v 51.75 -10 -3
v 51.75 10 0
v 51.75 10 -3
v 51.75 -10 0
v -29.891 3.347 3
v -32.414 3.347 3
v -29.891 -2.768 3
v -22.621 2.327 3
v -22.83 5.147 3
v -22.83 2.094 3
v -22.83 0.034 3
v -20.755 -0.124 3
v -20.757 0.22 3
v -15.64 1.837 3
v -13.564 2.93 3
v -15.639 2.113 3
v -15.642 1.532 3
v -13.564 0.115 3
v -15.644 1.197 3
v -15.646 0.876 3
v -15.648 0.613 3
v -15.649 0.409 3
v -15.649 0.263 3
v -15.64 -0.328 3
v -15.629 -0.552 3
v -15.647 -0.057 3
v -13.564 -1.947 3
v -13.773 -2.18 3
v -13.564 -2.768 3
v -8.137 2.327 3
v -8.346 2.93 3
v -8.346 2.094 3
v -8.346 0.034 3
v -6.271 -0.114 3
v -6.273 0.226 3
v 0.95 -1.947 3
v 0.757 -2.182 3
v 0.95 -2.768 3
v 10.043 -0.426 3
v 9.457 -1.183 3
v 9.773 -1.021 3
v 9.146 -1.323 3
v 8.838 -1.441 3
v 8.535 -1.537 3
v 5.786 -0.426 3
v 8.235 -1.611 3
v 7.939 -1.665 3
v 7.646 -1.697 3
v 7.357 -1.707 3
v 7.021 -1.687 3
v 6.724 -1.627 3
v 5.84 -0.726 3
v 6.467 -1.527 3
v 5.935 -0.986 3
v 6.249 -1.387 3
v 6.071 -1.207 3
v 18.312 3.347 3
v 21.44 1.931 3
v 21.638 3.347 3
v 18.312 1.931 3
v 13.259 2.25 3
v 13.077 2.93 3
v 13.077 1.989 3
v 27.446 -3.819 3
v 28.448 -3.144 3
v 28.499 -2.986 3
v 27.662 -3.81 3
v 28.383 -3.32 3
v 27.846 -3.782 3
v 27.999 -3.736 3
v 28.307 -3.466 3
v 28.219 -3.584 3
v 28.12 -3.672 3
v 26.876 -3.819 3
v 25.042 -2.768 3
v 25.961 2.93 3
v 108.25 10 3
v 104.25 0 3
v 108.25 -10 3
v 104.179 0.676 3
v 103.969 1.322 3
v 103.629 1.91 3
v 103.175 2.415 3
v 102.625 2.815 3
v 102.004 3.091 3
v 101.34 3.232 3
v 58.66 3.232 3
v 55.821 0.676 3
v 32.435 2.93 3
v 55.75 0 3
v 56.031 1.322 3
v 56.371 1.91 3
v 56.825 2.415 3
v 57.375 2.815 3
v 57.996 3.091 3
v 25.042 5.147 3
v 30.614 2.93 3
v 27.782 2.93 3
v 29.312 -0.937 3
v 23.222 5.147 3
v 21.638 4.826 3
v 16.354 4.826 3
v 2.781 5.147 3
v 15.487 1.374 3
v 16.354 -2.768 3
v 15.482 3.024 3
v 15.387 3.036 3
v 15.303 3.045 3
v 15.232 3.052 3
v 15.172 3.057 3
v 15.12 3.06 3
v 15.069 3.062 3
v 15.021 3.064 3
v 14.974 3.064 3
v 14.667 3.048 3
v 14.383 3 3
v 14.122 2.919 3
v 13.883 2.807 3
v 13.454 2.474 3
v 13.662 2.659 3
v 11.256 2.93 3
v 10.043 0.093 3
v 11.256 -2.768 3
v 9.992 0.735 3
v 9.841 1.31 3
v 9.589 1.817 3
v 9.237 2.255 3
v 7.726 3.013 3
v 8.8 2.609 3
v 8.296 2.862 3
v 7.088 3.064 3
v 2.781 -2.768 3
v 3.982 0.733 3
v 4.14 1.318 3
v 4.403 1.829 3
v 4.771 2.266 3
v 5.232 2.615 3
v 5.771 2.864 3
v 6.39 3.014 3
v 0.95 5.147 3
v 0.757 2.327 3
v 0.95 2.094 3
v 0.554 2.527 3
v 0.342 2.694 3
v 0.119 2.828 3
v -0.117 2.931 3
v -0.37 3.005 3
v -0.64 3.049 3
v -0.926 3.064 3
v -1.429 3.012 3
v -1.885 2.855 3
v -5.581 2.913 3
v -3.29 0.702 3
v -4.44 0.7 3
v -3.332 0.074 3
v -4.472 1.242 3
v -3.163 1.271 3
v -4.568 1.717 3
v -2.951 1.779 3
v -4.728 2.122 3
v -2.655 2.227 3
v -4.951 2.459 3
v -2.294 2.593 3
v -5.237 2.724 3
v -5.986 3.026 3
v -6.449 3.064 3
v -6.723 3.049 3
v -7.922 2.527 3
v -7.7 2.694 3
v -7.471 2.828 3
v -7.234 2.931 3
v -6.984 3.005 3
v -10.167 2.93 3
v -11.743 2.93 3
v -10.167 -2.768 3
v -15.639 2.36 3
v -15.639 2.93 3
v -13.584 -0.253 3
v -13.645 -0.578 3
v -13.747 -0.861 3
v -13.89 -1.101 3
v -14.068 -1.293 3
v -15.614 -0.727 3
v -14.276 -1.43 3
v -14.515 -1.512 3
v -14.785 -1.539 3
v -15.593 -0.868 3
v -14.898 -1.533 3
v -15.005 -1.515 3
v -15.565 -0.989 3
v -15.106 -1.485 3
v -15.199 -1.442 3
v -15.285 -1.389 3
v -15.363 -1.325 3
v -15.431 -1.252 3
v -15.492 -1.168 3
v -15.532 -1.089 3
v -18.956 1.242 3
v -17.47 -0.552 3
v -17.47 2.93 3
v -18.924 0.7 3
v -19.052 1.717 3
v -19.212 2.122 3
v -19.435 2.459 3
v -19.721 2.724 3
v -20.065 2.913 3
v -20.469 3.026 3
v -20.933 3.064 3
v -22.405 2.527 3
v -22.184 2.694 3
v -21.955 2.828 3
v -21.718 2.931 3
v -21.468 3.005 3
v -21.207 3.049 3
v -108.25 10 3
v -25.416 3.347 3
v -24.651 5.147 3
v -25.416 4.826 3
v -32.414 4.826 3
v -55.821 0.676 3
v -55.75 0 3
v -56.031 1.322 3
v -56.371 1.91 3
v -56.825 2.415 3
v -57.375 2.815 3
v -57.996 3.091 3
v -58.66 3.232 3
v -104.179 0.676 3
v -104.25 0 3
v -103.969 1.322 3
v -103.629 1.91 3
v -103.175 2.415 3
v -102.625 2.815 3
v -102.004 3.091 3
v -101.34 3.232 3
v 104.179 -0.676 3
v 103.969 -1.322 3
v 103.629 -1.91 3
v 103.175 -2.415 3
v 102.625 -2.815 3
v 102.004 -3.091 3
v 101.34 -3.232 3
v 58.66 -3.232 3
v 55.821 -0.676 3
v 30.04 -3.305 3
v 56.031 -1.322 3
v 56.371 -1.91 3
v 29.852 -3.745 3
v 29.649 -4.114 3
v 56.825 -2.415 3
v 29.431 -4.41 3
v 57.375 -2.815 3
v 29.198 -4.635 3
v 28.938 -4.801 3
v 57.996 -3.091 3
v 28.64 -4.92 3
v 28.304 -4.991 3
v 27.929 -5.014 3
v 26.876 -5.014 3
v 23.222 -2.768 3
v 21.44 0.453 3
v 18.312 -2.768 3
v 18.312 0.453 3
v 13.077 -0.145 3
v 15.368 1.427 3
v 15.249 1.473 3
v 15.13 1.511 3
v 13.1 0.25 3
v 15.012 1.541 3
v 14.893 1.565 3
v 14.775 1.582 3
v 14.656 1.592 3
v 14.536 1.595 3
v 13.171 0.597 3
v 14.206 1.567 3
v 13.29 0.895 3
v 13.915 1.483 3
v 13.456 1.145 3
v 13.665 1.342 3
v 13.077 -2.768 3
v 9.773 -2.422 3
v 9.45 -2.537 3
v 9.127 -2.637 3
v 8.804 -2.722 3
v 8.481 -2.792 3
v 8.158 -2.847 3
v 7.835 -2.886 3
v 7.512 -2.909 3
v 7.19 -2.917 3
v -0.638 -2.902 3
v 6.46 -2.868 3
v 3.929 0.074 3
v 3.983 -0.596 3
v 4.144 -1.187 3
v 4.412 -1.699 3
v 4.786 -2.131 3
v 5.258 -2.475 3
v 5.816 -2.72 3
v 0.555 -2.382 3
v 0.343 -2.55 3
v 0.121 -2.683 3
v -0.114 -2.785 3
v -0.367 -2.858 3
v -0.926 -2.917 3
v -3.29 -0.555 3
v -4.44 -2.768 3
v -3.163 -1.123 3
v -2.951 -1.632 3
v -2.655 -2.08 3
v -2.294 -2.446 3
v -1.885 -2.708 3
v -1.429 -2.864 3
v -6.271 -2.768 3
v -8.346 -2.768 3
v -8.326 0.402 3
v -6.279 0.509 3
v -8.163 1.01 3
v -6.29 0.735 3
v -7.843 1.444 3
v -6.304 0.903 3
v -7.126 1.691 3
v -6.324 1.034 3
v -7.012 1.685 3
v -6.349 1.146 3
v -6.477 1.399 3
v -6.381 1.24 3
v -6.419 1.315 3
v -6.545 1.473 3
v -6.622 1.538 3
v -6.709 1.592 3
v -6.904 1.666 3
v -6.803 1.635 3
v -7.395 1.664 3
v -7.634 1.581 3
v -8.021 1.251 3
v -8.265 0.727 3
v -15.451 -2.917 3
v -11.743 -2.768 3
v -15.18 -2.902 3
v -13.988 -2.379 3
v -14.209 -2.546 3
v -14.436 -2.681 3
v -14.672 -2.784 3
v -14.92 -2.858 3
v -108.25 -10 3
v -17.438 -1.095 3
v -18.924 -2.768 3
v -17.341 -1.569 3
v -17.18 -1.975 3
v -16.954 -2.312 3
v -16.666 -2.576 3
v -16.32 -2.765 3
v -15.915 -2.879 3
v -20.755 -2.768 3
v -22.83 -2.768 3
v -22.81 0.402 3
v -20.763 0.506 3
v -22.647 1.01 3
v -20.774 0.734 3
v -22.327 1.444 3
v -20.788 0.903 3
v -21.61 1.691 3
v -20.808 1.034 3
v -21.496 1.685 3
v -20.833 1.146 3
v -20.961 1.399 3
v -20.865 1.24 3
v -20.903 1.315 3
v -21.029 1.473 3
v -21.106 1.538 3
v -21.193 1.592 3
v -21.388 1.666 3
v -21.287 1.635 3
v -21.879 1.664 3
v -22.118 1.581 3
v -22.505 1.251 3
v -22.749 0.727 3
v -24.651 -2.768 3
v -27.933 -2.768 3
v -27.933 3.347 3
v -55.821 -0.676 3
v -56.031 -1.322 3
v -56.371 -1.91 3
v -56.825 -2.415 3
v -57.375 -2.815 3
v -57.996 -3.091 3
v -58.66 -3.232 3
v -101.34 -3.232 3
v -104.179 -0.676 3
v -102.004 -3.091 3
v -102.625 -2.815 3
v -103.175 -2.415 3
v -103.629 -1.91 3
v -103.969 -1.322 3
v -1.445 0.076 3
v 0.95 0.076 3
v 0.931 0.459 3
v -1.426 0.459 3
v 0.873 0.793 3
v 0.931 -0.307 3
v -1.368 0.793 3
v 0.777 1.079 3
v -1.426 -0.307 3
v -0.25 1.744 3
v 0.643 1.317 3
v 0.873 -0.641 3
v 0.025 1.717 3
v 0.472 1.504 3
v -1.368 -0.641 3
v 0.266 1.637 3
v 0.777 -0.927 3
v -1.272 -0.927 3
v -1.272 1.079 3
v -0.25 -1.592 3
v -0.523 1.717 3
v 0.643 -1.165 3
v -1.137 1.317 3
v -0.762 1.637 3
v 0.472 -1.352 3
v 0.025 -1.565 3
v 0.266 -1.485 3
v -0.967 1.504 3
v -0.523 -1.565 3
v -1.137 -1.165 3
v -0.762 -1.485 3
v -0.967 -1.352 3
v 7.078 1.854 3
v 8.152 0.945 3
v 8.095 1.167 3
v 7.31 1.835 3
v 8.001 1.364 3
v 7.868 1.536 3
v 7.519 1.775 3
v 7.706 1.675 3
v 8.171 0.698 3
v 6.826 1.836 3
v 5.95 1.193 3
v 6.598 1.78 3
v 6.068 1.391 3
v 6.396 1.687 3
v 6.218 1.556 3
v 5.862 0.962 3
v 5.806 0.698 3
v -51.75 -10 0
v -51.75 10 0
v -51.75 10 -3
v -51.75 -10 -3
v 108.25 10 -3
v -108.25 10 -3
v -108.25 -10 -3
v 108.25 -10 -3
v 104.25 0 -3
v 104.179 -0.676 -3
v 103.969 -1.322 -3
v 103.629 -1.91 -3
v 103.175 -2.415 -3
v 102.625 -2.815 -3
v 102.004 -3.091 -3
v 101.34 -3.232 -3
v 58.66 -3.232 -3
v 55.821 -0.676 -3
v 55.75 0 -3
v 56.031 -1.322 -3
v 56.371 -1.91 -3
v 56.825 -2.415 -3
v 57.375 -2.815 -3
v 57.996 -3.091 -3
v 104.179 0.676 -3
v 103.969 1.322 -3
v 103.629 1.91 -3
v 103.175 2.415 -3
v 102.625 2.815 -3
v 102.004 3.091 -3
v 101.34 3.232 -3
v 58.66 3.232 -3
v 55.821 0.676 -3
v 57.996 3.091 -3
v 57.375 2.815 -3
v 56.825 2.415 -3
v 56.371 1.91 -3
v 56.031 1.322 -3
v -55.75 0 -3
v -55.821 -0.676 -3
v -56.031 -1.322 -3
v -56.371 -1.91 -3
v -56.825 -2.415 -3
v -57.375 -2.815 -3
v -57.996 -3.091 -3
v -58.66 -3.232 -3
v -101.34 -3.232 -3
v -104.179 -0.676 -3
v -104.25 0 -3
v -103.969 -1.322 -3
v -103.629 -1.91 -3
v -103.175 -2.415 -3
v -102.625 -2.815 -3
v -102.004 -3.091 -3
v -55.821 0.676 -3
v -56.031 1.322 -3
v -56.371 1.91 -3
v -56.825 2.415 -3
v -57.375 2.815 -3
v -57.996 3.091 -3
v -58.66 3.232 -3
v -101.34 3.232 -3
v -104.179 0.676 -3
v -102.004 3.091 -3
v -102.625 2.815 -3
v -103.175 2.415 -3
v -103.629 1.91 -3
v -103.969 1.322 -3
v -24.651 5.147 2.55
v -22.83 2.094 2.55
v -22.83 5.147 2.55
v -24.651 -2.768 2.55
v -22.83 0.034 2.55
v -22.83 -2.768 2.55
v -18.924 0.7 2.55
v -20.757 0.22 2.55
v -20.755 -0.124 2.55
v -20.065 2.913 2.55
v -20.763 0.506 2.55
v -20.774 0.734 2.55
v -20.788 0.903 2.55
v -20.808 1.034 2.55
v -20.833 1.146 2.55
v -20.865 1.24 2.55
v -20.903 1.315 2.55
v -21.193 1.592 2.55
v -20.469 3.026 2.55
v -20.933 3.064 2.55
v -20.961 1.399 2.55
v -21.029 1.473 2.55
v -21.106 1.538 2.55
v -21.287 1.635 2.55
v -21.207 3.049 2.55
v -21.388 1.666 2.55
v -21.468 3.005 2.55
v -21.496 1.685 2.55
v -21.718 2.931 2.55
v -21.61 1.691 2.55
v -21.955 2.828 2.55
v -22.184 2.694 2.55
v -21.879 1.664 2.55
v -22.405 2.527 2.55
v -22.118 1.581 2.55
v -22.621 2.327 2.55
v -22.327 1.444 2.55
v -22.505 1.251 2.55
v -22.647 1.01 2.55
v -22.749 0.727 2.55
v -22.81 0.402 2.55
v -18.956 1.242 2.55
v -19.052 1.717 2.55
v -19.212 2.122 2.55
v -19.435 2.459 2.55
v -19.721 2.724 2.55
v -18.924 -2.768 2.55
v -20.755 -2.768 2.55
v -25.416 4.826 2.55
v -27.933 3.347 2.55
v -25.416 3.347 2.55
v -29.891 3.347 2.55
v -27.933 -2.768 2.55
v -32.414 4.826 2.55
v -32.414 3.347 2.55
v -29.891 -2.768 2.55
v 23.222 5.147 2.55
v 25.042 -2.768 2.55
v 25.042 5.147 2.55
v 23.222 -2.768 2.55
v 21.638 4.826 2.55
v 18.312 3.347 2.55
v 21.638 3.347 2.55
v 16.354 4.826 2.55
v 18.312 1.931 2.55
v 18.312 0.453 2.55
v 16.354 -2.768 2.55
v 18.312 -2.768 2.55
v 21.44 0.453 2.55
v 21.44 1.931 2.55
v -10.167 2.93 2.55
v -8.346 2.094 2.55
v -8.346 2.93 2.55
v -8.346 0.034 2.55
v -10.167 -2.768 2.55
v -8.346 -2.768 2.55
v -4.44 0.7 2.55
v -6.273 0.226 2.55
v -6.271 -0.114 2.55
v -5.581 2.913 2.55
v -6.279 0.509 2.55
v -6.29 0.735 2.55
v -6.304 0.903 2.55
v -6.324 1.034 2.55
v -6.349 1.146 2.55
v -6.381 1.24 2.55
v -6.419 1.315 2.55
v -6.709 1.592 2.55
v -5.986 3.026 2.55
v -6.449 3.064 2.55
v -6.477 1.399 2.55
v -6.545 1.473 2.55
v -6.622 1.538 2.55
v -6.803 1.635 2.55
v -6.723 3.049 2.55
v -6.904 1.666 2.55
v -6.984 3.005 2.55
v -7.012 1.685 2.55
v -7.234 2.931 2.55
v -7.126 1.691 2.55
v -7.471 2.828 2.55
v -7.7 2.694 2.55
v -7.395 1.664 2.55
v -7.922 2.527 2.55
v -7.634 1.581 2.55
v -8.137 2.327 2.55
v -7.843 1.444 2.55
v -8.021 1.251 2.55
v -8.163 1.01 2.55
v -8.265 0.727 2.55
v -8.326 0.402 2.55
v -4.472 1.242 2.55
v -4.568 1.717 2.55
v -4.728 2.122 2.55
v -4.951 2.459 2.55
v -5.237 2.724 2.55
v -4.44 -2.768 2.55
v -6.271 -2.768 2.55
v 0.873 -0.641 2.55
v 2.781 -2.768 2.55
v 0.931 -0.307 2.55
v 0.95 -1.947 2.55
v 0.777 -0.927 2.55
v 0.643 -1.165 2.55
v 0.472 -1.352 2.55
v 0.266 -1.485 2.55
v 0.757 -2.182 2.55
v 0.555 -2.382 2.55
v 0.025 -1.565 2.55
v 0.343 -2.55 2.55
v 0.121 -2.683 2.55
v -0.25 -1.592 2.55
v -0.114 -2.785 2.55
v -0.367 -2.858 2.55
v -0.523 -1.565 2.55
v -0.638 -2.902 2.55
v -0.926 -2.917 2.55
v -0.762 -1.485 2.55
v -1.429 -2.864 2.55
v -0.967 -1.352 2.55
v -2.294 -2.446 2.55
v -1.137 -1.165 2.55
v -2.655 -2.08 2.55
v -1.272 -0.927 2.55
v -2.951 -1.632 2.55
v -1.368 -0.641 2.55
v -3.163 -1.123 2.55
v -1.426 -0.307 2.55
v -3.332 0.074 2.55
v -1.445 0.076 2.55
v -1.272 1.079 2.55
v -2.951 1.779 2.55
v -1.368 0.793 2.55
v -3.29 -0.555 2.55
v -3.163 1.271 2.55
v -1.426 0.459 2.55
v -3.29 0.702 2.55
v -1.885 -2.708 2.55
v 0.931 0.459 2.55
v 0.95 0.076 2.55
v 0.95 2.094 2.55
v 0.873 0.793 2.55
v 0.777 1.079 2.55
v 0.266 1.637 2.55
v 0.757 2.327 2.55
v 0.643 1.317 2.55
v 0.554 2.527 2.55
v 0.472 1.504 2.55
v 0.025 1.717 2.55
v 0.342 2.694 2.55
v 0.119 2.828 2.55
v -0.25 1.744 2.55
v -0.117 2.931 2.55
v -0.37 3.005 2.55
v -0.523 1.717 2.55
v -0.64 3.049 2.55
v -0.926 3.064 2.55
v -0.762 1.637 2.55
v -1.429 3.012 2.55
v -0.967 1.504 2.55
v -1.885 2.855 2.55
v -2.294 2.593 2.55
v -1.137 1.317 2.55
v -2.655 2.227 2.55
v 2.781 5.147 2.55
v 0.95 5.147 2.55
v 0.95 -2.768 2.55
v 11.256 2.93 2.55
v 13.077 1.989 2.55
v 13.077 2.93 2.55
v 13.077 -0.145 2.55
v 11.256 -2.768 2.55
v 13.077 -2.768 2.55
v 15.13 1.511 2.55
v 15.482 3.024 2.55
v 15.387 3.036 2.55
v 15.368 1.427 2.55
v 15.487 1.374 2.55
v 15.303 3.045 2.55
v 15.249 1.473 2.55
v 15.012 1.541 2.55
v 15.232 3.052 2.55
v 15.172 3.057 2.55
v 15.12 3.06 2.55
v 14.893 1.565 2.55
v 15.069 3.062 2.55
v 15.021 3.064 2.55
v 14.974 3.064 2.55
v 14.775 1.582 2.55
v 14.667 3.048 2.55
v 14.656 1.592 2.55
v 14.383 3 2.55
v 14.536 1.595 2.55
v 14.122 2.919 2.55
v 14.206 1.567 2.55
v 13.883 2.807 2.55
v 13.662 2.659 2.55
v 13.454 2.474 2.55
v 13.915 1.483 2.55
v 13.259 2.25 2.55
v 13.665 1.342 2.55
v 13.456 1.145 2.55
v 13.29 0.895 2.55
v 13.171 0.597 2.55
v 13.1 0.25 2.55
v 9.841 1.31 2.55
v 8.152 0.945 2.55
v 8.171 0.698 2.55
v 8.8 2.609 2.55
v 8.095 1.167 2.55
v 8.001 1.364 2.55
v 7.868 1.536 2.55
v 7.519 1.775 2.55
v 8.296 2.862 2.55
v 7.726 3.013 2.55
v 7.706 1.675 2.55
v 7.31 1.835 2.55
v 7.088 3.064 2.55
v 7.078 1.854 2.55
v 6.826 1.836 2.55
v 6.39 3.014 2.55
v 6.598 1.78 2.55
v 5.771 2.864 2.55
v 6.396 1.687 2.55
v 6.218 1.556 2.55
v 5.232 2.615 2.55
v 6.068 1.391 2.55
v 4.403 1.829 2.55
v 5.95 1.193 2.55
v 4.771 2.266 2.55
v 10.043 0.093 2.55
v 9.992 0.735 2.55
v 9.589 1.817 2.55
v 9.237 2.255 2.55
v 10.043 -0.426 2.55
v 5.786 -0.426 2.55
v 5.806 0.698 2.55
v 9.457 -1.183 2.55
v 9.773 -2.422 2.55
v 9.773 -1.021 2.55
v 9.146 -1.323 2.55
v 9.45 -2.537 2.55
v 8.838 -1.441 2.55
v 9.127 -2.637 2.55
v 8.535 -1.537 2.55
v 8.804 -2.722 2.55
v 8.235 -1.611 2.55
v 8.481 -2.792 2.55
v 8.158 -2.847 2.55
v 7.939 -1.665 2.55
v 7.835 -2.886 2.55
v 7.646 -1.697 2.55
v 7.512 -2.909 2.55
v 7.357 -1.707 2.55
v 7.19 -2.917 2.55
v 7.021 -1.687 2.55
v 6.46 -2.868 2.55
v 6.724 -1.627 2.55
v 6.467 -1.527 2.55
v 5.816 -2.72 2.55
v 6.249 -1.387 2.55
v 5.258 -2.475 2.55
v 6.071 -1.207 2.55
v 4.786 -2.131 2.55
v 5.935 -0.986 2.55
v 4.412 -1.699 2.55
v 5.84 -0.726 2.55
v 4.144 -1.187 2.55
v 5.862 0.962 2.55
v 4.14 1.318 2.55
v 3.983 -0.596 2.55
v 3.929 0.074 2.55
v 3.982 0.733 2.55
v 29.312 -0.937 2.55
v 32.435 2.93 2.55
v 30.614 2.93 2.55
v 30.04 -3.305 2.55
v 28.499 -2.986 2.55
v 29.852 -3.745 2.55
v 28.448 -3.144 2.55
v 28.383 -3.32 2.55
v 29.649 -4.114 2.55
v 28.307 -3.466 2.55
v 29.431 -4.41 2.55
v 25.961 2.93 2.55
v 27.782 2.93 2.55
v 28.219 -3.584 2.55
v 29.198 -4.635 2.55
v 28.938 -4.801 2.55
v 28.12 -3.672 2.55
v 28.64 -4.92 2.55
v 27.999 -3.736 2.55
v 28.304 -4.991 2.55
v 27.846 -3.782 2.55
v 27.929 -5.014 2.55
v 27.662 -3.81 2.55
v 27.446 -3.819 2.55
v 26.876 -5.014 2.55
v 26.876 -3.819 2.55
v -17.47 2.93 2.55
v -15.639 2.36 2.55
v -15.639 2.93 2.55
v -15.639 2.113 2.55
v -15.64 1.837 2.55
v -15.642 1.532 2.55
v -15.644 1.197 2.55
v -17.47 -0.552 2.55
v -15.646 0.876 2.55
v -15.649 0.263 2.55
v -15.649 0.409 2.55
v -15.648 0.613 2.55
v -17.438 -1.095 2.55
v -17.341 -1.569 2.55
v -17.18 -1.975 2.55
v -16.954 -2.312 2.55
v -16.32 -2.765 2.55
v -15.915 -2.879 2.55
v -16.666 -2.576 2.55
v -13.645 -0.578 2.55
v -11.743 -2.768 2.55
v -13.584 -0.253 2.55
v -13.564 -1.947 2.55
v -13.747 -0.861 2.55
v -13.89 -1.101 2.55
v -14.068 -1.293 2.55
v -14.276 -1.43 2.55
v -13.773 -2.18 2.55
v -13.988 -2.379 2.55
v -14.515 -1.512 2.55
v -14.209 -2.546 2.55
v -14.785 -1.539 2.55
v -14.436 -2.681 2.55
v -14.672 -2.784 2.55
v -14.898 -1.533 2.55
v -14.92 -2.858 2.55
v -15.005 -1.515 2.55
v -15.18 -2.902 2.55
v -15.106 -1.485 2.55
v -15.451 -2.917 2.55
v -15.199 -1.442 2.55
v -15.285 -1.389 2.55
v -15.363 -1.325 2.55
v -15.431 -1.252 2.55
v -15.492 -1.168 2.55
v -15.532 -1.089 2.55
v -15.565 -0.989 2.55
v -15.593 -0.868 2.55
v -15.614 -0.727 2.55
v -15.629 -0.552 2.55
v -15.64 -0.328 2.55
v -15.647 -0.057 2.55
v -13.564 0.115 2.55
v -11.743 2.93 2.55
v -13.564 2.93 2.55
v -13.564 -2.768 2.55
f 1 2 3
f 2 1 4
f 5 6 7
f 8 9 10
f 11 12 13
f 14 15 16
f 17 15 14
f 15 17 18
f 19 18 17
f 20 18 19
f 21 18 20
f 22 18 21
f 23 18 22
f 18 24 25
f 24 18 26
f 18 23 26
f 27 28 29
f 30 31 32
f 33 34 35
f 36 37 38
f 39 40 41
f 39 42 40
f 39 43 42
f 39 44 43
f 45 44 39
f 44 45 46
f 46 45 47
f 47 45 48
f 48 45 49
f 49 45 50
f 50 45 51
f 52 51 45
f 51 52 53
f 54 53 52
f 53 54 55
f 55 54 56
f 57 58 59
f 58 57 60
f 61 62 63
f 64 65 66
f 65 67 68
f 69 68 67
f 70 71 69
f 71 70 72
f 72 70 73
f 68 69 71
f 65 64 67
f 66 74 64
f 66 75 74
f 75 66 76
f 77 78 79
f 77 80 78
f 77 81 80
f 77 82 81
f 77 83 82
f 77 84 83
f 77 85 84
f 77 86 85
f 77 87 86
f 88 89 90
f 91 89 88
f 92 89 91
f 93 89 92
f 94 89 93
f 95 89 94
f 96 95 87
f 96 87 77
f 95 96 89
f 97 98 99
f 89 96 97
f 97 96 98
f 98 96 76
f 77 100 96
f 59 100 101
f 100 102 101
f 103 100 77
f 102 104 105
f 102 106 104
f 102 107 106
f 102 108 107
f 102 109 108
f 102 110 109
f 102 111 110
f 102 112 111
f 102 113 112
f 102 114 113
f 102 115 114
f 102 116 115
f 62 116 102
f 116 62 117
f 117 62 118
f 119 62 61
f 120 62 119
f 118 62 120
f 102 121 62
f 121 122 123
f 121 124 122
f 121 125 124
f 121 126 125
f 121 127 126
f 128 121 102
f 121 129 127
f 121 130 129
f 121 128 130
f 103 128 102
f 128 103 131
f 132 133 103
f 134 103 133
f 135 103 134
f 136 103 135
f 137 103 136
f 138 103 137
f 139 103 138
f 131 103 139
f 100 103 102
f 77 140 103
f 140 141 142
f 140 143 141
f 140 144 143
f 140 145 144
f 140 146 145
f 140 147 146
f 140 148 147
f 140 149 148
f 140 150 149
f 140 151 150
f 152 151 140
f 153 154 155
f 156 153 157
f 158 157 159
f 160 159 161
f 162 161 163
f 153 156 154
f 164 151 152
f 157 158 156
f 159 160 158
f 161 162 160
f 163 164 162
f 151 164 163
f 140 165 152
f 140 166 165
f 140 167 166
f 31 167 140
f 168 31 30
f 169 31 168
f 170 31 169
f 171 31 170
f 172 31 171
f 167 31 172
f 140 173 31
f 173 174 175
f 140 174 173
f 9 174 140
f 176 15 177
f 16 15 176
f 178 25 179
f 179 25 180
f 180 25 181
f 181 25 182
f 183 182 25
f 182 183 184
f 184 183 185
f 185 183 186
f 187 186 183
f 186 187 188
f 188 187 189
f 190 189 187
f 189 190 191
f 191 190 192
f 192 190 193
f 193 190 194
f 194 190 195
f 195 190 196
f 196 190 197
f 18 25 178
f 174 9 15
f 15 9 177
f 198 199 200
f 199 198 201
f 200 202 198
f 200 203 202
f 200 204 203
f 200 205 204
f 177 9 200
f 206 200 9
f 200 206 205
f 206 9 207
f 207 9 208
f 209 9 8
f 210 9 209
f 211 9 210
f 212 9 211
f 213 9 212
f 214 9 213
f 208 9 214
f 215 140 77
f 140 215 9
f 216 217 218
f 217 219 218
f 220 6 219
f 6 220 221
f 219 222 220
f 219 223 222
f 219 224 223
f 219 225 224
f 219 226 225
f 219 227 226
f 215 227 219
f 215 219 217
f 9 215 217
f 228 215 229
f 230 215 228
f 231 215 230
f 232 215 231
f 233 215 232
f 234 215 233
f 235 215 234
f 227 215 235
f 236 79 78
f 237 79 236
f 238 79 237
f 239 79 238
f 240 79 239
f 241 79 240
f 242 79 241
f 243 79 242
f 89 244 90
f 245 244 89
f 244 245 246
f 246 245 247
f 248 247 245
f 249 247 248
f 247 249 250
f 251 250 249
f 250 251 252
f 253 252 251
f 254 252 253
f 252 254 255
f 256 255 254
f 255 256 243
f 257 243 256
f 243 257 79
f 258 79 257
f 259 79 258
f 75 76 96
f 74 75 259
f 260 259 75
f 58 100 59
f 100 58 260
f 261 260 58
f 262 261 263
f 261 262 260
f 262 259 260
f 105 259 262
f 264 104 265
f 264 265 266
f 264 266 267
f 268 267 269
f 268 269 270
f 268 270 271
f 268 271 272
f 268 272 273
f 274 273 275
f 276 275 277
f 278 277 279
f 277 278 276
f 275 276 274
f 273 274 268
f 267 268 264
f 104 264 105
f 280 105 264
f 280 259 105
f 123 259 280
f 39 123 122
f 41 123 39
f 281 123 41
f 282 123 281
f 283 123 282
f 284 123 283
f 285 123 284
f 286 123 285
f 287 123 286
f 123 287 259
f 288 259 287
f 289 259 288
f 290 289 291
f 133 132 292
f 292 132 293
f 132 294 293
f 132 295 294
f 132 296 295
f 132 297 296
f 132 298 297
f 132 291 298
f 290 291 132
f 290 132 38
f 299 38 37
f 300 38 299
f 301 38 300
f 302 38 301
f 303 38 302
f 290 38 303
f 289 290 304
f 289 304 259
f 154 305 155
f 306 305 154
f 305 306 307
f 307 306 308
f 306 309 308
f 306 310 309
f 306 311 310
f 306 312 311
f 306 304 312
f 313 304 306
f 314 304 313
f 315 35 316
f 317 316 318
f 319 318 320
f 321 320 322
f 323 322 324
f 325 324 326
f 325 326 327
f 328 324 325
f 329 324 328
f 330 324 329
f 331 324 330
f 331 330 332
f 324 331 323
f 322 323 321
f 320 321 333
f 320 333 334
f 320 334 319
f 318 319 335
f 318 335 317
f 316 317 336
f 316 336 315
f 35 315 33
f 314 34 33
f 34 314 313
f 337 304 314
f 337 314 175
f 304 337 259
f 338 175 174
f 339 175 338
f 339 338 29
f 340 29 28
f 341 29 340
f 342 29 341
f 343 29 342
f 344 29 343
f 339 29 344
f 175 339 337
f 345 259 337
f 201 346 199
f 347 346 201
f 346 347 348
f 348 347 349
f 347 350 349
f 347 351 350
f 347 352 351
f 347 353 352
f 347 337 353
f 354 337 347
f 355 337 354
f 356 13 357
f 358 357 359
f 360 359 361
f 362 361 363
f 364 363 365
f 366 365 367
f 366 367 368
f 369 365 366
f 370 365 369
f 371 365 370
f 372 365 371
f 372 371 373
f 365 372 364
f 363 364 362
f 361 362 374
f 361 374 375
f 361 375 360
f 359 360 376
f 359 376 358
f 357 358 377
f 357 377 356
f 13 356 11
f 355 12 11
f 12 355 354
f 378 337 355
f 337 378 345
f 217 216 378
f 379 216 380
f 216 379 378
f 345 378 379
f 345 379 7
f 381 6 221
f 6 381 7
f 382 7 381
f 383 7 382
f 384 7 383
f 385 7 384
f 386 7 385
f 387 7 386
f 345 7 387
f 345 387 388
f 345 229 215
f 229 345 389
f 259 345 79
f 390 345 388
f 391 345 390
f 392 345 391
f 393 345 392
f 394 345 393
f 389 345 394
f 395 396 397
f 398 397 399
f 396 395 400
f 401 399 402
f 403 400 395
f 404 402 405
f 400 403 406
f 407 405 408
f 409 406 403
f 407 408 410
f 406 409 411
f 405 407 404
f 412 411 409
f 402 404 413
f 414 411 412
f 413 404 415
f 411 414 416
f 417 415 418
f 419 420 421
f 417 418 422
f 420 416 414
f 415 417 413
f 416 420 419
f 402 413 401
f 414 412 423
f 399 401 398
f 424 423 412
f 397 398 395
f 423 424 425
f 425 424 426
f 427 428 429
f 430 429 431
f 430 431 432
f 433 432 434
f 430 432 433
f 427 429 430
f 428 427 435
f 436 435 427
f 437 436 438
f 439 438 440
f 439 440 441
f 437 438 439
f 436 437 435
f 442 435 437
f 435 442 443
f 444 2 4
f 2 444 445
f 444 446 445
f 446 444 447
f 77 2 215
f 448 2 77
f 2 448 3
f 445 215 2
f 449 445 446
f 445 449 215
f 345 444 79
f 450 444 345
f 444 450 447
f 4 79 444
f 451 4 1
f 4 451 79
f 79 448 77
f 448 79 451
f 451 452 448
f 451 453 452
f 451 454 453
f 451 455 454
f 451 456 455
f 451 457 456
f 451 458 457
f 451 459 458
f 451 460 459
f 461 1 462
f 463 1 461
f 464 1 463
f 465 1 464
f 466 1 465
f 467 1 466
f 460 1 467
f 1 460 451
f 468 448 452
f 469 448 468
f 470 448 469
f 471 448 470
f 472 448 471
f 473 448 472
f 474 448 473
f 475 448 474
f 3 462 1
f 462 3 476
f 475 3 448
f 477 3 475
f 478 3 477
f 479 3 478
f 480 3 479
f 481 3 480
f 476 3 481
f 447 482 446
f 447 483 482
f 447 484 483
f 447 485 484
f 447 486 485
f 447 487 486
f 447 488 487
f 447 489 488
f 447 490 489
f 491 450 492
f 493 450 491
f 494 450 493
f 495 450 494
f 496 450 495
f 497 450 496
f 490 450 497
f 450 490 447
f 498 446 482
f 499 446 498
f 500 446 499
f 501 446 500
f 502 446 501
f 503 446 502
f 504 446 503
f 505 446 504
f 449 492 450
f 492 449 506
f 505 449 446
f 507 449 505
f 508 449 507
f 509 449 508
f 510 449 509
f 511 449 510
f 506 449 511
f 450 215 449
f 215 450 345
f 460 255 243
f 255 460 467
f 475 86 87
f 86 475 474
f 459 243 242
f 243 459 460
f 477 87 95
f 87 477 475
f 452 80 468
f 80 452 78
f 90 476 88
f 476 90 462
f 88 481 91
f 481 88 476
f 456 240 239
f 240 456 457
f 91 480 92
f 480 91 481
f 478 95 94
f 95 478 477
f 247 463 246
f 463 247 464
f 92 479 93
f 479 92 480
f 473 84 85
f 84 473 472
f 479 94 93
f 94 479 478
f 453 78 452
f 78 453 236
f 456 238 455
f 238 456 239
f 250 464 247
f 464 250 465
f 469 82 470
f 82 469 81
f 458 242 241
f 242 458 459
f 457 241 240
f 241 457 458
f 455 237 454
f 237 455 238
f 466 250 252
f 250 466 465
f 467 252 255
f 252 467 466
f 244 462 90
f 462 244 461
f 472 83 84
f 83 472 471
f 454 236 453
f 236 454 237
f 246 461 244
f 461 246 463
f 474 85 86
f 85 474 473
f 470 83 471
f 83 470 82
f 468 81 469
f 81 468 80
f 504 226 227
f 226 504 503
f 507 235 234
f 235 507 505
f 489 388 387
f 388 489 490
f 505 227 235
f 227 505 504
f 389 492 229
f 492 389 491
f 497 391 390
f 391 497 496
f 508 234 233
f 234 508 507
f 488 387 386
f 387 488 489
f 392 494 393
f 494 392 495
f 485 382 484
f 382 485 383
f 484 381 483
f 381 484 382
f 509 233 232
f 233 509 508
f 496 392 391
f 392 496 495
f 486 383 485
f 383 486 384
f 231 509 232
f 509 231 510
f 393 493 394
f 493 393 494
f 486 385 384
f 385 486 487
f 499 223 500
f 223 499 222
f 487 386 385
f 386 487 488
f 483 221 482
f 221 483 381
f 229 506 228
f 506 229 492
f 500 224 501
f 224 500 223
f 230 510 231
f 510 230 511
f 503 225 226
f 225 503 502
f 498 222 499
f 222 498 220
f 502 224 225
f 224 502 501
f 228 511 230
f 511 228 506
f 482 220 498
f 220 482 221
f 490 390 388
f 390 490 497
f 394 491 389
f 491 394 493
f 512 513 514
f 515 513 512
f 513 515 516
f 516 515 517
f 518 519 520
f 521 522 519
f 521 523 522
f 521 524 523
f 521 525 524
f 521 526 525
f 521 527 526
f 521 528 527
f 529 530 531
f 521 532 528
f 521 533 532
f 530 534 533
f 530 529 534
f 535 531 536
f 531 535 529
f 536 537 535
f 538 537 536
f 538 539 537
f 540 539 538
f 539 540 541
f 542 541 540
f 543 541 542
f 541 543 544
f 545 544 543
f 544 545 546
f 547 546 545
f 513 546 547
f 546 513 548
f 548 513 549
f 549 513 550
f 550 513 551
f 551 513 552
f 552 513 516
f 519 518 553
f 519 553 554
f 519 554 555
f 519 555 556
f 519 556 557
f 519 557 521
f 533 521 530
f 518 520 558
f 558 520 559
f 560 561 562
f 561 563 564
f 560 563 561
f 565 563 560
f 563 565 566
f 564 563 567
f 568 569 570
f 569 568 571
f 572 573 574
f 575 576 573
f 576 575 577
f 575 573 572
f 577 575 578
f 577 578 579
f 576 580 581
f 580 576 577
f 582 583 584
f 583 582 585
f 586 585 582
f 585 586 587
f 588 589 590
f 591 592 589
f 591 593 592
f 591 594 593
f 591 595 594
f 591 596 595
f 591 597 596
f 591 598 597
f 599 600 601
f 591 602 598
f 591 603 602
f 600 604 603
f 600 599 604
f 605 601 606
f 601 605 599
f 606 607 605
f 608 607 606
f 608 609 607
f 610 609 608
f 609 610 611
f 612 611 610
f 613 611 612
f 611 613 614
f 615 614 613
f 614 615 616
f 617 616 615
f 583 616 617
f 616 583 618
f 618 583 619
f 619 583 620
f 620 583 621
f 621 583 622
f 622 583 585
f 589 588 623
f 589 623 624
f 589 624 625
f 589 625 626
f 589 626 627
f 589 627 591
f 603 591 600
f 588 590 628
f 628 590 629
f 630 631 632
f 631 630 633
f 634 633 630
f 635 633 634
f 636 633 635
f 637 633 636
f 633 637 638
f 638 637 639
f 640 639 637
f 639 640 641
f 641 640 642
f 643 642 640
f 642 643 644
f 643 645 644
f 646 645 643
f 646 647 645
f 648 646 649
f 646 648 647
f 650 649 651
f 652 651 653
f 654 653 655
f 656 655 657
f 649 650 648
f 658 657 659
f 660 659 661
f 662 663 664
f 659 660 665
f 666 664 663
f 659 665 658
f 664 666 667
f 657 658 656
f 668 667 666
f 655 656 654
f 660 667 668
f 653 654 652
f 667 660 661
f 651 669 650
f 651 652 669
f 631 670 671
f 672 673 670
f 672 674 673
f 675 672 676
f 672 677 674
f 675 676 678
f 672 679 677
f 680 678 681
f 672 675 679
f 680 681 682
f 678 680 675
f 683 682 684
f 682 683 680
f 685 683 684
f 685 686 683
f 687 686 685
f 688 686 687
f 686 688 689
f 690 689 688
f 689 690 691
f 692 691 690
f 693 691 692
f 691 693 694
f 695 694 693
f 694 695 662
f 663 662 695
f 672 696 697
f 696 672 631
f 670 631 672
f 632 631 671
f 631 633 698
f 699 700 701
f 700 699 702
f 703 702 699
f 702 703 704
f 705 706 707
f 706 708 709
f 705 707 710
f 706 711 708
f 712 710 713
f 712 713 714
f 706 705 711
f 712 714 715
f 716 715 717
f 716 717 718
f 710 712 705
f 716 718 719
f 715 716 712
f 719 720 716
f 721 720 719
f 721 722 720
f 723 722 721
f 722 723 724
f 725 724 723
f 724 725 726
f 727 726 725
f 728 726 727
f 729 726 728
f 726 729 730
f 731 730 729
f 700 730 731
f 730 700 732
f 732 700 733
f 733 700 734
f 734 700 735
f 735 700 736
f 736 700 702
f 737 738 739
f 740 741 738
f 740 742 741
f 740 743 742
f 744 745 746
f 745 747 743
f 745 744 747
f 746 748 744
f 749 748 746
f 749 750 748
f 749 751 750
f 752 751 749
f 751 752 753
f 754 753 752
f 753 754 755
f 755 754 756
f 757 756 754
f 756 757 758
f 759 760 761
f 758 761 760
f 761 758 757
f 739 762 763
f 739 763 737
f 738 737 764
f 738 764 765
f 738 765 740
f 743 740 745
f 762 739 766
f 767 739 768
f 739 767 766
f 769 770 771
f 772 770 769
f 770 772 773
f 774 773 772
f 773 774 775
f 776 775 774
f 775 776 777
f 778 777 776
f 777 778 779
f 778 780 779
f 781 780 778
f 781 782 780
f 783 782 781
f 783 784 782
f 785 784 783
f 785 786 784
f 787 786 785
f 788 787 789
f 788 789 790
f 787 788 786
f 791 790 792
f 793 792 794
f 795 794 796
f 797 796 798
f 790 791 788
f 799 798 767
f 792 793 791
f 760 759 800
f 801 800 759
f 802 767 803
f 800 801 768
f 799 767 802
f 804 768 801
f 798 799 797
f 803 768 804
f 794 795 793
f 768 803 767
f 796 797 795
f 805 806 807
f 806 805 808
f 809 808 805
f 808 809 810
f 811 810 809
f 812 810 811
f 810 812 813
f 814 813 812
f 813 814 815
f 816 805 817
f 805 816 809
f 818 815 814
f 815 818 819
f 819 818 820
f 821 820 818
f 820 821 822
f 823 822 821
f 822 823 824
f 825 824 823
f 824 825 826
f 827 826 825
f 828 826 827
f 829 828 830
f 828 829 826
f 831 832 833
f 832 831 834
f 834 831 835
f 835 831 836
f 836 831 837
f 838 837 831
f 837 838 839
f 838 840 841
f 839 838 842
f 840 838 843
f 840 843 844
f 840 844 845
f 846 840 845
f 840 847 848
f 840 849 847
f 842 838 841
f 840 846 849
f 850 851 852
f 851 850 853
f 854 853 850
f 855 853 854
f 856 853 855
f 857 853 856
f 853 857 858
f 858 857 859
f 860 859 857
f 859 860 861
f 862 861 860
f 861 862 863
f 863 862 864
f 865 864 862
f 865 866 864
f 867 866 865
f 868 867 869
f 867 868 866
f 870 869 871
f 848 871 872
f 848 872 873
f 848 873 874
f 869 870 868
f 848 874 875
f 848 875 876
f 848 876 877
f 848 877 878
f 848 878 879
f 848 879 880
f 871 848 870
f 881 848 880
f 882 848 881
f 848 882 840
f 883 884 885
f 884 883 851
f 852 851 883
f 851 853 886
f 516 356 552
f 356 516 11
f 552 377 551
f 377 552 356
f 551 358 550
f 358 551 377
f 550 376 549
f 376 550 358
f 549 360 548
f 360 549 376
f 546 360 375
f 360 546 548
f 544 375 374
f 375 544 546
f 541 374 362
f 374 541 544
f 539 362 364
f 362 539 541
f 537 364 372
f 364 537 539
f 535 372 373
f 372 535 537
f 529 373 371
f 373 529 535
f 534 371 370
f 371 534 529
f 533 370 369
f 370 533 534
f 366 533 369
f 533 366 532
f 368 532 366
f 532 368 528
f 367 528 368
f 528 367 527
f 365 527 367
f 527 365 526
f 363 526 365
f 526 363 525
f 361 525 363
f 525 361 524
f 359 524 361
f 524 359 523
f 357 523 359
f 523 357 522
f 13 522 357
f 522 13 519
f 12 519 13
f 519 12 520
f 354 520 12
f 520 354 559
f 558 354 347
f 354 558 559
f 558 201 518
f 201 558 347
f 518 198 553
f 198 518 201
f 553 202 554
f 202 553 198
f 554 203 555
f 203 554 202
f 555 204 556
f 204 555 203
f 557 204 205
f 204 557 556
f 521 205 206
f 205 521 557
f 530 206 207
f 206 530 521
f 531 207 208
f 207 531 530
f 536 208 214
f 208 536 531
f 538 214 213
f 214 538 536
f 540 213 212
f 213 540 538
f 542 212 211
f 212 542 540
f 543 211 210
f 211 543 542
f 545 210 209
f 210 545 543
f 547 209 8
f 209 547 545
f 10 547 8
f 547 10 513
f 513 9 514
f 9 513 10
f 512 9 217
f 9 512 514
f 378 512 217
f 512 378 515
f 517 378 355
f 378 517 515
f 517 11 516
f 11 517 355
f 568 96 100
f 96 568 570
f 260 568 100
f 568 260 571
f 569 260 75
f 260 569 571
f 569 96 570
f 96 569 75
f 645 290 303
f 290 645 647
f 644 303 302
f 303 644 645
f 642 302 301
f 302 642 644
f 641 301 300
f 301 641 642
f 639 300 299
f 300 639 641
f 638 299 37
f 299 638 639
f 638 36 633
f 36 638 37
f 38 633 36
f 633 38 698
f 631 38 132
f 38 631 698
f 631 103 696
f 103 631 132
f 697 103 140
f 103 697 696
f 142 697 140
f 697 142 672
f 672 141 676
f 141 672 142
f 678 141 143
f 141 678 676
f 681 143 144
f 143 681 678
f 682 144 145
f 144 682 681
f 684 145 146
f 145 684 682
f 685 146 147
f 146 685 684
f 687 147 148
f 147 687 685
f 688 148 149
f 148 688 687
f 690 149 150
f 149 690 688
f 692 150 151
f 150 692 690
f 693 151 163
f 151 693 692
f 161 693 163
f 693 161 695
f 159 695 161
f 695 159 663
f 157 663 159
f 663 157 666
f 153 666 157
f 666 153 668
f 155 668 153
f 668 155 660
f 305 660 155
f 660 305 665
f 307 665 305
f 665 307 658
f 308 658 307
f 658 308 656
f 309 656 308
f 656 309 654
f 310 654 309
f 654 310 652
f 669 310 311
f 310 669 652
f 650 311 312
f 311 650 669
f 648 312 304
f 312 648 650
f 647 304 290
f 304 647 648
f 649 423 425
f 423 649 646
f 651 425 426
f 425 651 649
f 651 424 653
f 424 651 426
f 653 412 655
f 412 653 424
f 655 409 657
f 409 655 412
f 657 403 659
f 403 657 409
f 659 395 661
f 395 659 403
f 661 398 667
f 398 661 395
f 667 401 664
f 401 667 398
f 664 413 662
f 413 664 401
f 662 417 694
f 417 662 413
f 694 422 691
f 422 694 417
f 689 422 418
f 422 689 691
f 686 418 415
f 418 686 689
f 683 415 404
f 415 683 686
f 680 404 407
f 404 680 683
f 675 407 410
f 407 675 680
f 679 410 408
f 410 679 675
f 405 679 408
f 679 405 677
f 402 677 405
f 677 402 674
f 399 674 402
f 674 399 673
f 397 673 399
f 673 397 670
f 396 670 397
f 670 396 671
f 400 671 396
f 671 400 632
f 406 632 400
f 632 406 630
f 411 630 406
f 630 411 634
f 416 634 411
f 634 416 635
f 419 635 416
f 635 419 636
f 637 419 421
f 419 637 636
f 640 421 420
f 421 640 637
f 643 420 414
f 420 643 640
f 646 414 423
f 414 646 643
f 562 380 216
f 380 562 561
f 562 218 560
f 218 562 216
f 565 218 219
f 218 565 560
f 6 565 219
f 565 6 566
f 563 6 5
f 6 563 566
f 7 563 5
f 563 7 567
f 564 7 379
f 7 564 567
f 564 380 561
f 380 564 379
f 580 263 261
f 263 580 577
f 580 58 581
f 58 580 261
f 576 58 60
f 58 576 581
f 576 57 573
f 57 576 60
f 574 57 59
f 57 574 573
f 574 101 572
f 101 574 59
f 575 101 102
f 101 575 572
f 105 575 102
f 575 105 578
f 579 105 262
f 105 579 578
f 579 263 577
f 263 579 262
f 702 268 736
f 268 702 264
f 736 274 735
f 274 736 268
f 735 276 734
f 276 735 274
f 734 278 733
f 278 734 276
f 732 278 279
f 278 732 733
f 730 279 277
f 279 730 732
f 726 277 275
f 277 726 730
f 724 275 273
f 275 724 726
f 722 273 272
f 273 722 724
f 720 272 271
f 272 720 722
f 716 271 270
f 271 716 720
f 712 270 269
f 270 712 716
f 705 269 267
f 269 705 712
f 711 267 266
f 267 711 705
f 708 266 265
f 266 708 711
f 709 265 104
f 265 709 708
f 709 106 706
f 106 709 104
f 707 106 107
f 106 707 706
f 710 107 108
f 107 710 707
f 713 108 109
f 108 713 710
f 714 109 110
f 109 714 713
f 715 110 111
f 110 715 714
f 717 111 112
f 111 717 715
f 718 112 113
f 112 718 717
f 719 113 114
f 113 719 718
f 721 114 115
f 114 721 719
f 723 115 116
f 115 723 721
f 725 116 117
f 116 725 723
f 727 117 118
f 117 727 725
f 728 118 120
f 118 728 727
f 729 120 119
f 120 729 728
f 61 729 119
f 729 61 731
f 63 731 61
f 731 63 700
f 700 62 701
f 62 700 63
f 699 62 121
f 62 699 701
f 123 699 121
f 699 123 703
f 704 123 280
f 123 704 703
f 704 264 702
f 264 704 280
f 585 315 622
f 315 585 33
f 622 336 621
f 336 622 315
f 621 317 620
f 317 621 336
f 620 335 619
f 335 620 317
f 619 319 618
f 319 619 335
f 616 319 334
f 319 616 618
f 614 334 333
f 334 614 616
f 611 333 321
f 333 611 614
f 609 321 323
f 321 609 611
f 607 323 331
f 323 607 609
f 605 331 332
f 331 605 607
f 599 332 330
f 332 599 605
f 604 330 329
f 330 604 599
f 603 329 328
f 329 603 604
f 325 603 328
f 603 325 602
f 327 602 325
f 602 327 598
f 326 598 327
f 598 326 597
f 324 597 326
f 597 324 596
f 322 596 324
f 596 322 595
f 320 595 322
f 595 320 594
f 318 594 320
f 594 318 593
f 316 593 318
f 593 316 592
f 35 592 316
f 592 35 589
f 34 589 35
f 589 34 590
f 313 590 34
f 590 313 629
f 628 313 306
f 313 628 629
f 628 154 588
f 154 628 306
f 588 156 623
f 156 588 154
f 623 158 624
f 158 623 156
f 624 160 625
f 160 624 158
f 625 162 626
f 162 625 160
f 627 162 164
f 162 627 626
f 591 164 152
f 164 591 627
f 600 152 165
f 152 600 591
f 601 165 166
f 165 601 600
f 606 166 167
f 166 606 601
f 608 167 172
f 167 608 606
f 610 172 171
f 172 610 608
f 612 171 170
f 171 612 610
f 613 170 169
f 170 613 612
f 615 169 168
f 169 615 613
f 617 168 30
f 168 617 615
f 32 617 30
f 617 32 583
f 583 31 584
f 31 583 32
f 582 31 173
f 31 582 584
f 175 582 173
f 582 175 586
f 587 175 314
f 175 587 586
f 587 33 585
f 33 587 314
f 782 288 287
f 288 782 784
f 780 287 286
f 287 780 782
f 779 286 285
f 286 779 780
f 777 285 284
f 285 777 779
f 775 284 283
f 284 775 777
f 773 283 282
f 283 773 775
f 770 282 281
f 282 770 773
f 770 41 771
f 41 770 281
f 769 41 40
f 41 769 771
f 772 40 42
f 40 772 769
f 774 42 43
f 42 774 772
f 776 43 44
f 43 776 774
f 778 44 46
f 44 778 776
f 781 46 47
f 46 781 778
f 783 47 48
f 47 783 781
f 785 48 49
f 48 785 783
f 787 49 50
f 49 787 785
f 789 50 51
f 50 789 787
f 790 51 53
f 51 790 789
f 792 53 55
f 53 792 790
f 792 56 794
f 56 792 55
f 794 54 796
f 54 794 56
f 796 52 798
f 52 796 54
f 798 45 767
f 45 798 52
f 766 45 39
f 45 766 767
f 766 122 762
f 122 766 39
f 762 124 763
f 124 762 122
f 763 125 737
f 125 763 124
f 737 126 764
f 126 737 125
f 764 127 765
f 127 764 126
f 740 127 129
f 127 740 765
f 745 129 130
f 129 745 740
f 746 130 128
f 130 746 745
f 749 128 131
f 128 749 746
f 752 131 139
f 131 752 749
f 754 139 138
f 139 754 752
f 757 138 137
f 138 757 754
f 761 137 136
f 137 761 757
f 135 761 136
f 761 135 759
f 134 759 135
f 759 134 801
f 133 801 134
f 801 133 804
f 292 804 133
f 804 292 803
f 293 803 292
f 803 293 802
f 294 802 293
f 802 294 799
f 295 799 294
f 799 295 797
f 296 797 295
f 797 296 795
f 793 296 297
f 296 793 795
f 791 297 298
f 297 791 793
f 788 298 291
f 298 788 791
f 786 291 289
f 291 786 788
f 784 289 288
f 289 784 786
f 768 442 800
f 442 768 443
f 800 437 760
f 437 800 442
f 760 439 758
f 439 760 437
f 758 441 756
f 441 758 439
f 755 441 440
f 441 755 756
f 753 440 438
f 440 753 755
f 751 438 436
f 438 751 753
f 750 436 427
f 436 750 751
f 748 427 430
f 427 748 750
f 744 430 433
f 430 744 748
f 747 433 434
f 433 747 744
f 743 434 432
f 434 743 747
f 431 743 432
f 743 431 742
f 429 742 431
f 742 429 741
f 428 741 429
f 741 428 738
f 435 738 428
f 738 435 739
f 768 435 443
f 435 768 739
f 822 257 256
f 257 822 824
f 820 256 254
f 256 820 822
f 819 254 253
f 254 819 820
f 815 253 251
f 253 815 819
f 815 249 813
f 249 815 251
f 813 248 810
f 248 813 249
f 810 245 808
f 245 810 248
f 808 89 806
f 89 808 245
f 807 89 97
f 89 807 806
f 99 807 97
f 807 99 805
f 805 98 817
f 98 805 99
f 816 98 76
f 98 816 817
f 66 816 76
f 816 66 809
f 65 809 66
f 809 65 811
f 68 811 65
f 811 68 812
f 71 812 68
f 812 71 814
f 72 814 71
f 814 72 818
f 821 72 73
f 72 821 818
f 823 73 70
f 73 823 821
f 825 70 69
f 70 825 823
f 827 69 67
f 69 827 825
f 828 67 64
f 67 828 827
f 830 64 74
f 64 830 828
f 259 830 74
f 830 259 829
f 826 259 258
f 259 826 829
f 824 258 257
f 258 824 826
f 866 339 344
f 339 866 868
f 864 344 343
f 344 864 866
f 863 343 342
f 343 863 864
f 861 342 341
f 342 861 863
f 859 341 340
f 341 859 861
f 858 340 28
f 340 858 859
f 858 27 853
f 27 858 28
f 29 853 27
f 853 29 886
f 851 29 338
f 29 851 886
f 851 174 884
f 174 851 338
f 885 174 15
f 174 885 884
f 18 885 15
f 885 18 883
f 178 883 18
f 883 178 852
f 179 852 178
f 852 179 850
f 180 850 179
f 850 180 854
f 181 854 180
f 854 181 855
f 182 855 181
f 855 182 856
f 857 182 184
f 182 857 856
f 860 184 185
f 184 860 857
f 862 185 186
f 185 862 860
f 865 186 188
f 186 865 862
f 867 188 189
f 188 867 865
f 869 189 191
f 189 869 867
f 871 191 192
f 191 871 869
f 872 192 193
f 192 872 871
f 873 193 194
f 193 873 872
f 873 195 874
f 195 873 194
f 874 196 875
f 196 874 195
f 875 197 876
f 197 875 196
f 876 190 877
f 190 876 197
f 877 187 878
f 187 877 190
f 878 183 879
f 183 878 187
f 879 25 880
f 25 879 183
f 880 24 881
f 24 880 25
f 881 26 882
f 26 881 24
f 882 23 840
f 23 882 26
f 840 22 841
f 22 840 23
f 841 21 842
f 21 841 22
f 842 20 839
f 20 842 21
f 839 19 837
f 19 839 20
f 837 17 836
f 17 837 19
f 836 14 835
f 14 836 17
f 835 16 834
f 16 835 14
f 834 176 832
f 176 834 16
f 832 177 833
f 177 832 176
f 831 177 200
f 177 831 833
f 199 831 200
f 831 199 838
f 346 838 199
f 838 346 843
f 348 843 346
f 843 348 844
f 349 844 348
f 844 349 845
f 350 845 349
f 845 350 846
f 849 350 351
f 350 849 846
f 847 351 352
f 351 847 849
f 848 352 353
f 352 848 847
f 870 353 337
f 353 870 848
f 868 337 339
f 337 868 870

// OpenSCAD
// file: ../parameters.scad
maximum_printable_size = 150;

layer_thickness = 0.3;
global_clearance = 0.5;


//Screw diameter and nut for M10 [mm]
M10_screw_diameter = 10.4;
M10_head_height = 10;
M10_head_diameter = 16+0.5;
M10_nut_height = 10.5;
M10_nut_diameter = 25.5;
M10_nut_pocket = 22.3;

//Screw diameter for M8 [mm]
M8_screw_diameter = 8.6;
M8_head_height = 8;
M8_head_diameter = 13.5;
M8_nut_height = 7.5;
M8_square_nut_thin_height = 4.5;
M8_nut_diameter = 14.4 + 0.5;
M8_nut_pocket = 13 + 0.5;
M8_washer_diameter = 16;
M8_washer_thickness = 1.5;


//Screw diameter and nut for M6 [mm]
M6_screw_diameter=6.5;
M6_head_diameter = 10+0.5;
M6_head_height = 6;
M6_nut_height = 4.9;
M6_nut_diameter = 11.8;
M6_nut_pocket = 10.4;
M6_square_nut_height = 3;
M6_square_nut_diameter = 10;
M6_washer_thickness = 1.6;

//Screw diameter and nut for M5 [mm]
M5_screw_diameter=5.5;
M5_head_height = 5;
M5_head_diameter = 13+0.5;
M5_nut_height = 4.5;
M5_nut_diameter = 9.4;
M5_nut_pocket = 8.4;

//Screw diameter and nut for M4 [mm]
M4_screw_diameter=4.5;
M4_screw_head_height = 4;
M4_nut_height = 3.2;
M4_nut_diameter = 8.4;
M4_nut_pocket = 7.5;

//Screw diameter and nut for M3 [mm]
M3_screw_diameter = 3.2;
M3_nut_height = 2.7;
M3_nut_diameter = 6.6;
M3_nut_pocket = 5.6;
M3_screw_head_height = 3;

//Screw diameter and nut for M2,5 [mm]
M2_5_screw_diameter = 2.7;
M2_5_nut_height = 2.3;
M2_5_nut_diameter = 6;
M2_5_nut_pocket = 5.5;

// kulove lozisko

bearing_efsm_08_h = 33+1;
bearing_efsm_08_m = 22;
bearing_efsm_08_db = 18;
bearing_efsm_08_ag = 10.5;
bearing_efsm_08_n = M4_screw_diameter;
bearing_efsm_08_a1 = 5.5;
bearing_efsm_08_d = 8.25;
bearing_efsm_08_B = 8; // ball height

bearing_efsm_10_h = 38+1;
bearing_efsm_10_m = 26;
bearing_efsm_10_db = 21.9;
bearing_efsm_10_ag = 12+0.2;
bearing_efsm_10_n = M5_screw_diameter;
bearing_efsm_10_a1 = 6.5;
bearing_efsm_10_d = 10.25;


bearing_efsm_12_width = 40+1;
bearing_efsm_12_h = bearing_efsm_12_width;
bearing_efsm_12_boltd = 28/2; // polovina vzdalenosti mezi srouby
bearing_efsm_12_m = bearing_efsm_12_boltd*2;
bearing_efsm_12_db = 25;
bearing_efsm_12_ag = 13;
bearing_efsm_12_a1 = 7;
bearing_efsm_12_n = M5_screw_diameter;
bearing_efsm_12_d = 12.15;
bearing_efsm_12_B = 10; // ball height
bearing_efsm_space = 1;

bearing_efsm_17_width = 54+1;
bearing_efsm_17_h = bearing_efsm_17_width;
bearing_efsm_17_boltd = 38/2; // polovina vzdalenosti mezi srouby
bearing_efsm_17_m = bearing_efsm_17_boltd*2;
bearing_efsm_17_db = 35;
bearing_efsm_17_ag = 18;
bearing_efsm_17_n = M6_screw_diameter;
bearing_efsm_17_a1 = 10;
bearing_efsm_17_B = 17; // ball height

//limcove lozisko
bearing_EFOM_10_L=26; //celkova sirka zakladny
bearing_EFOM_10_d1=10.3;//diametr otvoru real=10 mm
bearing_EFOM_10_dB=22;//diametr vystupku pro ulozeni lozika
bearing_EFOM_10_H=52;//celková delka zakladny
bearing_EFOM_10_J=36;// hole pitch
bearing_EFOM_10_A1=6.5;//vyska pouzdra
bearing_EFOM_10_Ag=12;//celkova vyska
bearing_EFOM_10_N1=5;//sirka otvoru pro sroub
bearing_EFOM_10_N2=8;//delka otvoru pro sroub
bearing_EFOM_10_m=36;//roztec der pro sroub
bearing_EFOM_10_h=9;//vyska lozika


608_bearing_outer_diameter = 22.3;
608_bearing_inner_diameter = 16;
608_bearing_thickness = 7.1;


// 20 KG servo parameters

servo_20kg_axis_offset = 9.375; // jak je osa mimo stredu
servo_20kg_body_x = 42;
servo_20kg_body_y = 21;
servo_20kg_body_z = 40;
servo_20kg_thread_x = 49/2;
servo_20kg_thread_y = 10/2;
servo_20kg_body_below = 10; // jak hluboko je tělo serva pod drzaky na srouby
servo_20kg_below = 25.8; // jak hluboko je páka serva pod drzaky na srouby

servo_20kg_bolt_d = 2.5+0.3;
servo_20kg_nut_d = 5+0.3;


//strain gauge
strain_gauge_width = 12.7;
strain_gauge_length = 75.1;
strain_gauge_screw_distance = 10;

//ALU profile
ALU_profile_width = 30.5;
ALU_profile_holder_wall_thickness = 3;
ALU_profile_groove_width = 8;

//pillow block bearing
//https://www.igus.eu/product/372
//Part no. KSTM-08
KSTM08_screws_distance = 33;         //m
KSTM08_screws_holes_diameter = 4.5;  //d2
KSTM08_flange_thickness = 6;         //h3
KSTM08_case_width = 9;               //C1
KSTM08_case_length = 47;             //a
KSTM08_ball_width = 12;              //B
KSTM08_ball_hole_diameter = 7.85;    //d1


//ložiska pro malý rotor
bearing_outer_diameter = 10.2;    // Rozměr B1 v nákresu s přídavkem na toleranci otvoru
bearing_thickness = 4;        // Rozměr B2 v nákresu
//bearing_shaft_length = 19.5;    // Rozměr B3 v nákresu, Originalni hodnota 19.5
bearing_shaft_length = 20;    // Rozměr B3 v nákresu


//simple platform parameters ////////////////////////////////////////////
front_holder_width = 160;
front_holder_angle = 25;
front_holder_height = 60;
front_holder_offset = 15;
front_holder_height_offset = 75;

// lock moving servo parameters
// static par.
servo_length = 23.1;
servo_width = 12.1;
servo_height = 26.7;
servo_axle_offset = 2.5;
servo_axle_height = 5;
servo_movement_angle = 40;
servo_movement_angle_offset = -10; // angle offset up
servo_force = 0.5; // [N/m] torque of servo

// dynamic par.
servo_arm_length = servo_width/2+ALU_profile_width/2+ALU_profile_holder_wall_thickness;
servo_travel_y = cos(servo_movement_angle)*servo_arm_length;
servo_arm_hole_length = (servo_arm_length/cos(servo_movement_angle+servo_movement_angle_offset))-servo_arm_length;
servo_joint_offset = sin(servo_movement_angle+servo_movement_angle_offset)*(servo_arm_length+servo_arm_hole_length+5);
servo_joint_offset_by_angle = -tan(servo_movement_angle_offset)*servo_arm_length;
servo_max_linear_force = servo_force/(servo_arm_length/1000); // max servo linear force [N]
servo_min_linear_force = cos(servo_movement_angle+abs(servo_movement_angle_offset))*servo_max_linear_force; // min servo linear force [N] in the most extreme position
servo_holding_linear_force = cos(servo_movement_angle+servo_movement_angle_offset)*servo_max_linear_force; // min servo linear force [N] in holding position

// lock static parameters
lock_screws_dia = 3.1;
lock_depth = 20;
lock_axle_diameter = 15;
lock_grab_axle_dia = 13;
lock_arms_joint_offset = 30;
lock_arms_joint_angle = 55;

// lock dynamic parameters
lock_push_force = (servo_holding_linear_force/cos(lock_arms_joint_angle))/cos(lock_arms_joint_angle); // lock arm pushing force on linear servo joint
lock_push_arm_length = tan(lock_arms_joint_angle)*lock_arms_joint_offset;
lock_arm_force_ratio = 1; // lock arm change holding force ratio (0.5 = arm will have half holding force)
lock_hold_arm_length = lock_push_arm_length/lock_arm_force_ratio;
lock_holding_force = lock_push_force*lock_arm_force_ratio;
lock_joint_arm_length = sqrt(pow(lock_push_arm_length, 2)+pow(lock_arms_joint_offset, 2));
// main file
include <../parameters.scad>


module 888_1016() {
	difference() {
		union() {
			translate([0, 0, 3/2])
			cube([103.5, 20, 3], true);

			translate([(160)/2, 0, 0])
			cube([56.5, 20, 6], true);

			translate([-(160)/2, 0, 0])
			cube([56.5, 20, 6], true);
		}
	
		// holding screws slots
		translate([160/2-42/2, 0, -5])
		hull() {
			cylinder(d=M6_screw_diameter, h=10, $fn=30);

			translate([42, 0, 0])
			cylinder(d=M6_screw_diameter, h=10, $fn=30);
		}

		rotate([0, 0, 180])
		translate([160/2-42/2, 0, -5])
		hull() {
			cylinder(d=M6_screw_diameter, h=10, $fn=30);

			translate([42, 0, 0])
			cylinder(d=M6_screw_diameter, h=10, $fn=30);
		}
	

		// ThunderFly text
		translate([0, 0, 2.55])
		linear_extrude(height = 0.5) {
			text("ThunderFly", size=7.5, font = "Cabin:style=Bold", valign="center", halign="center");
		}
	}
}

888_1016();
